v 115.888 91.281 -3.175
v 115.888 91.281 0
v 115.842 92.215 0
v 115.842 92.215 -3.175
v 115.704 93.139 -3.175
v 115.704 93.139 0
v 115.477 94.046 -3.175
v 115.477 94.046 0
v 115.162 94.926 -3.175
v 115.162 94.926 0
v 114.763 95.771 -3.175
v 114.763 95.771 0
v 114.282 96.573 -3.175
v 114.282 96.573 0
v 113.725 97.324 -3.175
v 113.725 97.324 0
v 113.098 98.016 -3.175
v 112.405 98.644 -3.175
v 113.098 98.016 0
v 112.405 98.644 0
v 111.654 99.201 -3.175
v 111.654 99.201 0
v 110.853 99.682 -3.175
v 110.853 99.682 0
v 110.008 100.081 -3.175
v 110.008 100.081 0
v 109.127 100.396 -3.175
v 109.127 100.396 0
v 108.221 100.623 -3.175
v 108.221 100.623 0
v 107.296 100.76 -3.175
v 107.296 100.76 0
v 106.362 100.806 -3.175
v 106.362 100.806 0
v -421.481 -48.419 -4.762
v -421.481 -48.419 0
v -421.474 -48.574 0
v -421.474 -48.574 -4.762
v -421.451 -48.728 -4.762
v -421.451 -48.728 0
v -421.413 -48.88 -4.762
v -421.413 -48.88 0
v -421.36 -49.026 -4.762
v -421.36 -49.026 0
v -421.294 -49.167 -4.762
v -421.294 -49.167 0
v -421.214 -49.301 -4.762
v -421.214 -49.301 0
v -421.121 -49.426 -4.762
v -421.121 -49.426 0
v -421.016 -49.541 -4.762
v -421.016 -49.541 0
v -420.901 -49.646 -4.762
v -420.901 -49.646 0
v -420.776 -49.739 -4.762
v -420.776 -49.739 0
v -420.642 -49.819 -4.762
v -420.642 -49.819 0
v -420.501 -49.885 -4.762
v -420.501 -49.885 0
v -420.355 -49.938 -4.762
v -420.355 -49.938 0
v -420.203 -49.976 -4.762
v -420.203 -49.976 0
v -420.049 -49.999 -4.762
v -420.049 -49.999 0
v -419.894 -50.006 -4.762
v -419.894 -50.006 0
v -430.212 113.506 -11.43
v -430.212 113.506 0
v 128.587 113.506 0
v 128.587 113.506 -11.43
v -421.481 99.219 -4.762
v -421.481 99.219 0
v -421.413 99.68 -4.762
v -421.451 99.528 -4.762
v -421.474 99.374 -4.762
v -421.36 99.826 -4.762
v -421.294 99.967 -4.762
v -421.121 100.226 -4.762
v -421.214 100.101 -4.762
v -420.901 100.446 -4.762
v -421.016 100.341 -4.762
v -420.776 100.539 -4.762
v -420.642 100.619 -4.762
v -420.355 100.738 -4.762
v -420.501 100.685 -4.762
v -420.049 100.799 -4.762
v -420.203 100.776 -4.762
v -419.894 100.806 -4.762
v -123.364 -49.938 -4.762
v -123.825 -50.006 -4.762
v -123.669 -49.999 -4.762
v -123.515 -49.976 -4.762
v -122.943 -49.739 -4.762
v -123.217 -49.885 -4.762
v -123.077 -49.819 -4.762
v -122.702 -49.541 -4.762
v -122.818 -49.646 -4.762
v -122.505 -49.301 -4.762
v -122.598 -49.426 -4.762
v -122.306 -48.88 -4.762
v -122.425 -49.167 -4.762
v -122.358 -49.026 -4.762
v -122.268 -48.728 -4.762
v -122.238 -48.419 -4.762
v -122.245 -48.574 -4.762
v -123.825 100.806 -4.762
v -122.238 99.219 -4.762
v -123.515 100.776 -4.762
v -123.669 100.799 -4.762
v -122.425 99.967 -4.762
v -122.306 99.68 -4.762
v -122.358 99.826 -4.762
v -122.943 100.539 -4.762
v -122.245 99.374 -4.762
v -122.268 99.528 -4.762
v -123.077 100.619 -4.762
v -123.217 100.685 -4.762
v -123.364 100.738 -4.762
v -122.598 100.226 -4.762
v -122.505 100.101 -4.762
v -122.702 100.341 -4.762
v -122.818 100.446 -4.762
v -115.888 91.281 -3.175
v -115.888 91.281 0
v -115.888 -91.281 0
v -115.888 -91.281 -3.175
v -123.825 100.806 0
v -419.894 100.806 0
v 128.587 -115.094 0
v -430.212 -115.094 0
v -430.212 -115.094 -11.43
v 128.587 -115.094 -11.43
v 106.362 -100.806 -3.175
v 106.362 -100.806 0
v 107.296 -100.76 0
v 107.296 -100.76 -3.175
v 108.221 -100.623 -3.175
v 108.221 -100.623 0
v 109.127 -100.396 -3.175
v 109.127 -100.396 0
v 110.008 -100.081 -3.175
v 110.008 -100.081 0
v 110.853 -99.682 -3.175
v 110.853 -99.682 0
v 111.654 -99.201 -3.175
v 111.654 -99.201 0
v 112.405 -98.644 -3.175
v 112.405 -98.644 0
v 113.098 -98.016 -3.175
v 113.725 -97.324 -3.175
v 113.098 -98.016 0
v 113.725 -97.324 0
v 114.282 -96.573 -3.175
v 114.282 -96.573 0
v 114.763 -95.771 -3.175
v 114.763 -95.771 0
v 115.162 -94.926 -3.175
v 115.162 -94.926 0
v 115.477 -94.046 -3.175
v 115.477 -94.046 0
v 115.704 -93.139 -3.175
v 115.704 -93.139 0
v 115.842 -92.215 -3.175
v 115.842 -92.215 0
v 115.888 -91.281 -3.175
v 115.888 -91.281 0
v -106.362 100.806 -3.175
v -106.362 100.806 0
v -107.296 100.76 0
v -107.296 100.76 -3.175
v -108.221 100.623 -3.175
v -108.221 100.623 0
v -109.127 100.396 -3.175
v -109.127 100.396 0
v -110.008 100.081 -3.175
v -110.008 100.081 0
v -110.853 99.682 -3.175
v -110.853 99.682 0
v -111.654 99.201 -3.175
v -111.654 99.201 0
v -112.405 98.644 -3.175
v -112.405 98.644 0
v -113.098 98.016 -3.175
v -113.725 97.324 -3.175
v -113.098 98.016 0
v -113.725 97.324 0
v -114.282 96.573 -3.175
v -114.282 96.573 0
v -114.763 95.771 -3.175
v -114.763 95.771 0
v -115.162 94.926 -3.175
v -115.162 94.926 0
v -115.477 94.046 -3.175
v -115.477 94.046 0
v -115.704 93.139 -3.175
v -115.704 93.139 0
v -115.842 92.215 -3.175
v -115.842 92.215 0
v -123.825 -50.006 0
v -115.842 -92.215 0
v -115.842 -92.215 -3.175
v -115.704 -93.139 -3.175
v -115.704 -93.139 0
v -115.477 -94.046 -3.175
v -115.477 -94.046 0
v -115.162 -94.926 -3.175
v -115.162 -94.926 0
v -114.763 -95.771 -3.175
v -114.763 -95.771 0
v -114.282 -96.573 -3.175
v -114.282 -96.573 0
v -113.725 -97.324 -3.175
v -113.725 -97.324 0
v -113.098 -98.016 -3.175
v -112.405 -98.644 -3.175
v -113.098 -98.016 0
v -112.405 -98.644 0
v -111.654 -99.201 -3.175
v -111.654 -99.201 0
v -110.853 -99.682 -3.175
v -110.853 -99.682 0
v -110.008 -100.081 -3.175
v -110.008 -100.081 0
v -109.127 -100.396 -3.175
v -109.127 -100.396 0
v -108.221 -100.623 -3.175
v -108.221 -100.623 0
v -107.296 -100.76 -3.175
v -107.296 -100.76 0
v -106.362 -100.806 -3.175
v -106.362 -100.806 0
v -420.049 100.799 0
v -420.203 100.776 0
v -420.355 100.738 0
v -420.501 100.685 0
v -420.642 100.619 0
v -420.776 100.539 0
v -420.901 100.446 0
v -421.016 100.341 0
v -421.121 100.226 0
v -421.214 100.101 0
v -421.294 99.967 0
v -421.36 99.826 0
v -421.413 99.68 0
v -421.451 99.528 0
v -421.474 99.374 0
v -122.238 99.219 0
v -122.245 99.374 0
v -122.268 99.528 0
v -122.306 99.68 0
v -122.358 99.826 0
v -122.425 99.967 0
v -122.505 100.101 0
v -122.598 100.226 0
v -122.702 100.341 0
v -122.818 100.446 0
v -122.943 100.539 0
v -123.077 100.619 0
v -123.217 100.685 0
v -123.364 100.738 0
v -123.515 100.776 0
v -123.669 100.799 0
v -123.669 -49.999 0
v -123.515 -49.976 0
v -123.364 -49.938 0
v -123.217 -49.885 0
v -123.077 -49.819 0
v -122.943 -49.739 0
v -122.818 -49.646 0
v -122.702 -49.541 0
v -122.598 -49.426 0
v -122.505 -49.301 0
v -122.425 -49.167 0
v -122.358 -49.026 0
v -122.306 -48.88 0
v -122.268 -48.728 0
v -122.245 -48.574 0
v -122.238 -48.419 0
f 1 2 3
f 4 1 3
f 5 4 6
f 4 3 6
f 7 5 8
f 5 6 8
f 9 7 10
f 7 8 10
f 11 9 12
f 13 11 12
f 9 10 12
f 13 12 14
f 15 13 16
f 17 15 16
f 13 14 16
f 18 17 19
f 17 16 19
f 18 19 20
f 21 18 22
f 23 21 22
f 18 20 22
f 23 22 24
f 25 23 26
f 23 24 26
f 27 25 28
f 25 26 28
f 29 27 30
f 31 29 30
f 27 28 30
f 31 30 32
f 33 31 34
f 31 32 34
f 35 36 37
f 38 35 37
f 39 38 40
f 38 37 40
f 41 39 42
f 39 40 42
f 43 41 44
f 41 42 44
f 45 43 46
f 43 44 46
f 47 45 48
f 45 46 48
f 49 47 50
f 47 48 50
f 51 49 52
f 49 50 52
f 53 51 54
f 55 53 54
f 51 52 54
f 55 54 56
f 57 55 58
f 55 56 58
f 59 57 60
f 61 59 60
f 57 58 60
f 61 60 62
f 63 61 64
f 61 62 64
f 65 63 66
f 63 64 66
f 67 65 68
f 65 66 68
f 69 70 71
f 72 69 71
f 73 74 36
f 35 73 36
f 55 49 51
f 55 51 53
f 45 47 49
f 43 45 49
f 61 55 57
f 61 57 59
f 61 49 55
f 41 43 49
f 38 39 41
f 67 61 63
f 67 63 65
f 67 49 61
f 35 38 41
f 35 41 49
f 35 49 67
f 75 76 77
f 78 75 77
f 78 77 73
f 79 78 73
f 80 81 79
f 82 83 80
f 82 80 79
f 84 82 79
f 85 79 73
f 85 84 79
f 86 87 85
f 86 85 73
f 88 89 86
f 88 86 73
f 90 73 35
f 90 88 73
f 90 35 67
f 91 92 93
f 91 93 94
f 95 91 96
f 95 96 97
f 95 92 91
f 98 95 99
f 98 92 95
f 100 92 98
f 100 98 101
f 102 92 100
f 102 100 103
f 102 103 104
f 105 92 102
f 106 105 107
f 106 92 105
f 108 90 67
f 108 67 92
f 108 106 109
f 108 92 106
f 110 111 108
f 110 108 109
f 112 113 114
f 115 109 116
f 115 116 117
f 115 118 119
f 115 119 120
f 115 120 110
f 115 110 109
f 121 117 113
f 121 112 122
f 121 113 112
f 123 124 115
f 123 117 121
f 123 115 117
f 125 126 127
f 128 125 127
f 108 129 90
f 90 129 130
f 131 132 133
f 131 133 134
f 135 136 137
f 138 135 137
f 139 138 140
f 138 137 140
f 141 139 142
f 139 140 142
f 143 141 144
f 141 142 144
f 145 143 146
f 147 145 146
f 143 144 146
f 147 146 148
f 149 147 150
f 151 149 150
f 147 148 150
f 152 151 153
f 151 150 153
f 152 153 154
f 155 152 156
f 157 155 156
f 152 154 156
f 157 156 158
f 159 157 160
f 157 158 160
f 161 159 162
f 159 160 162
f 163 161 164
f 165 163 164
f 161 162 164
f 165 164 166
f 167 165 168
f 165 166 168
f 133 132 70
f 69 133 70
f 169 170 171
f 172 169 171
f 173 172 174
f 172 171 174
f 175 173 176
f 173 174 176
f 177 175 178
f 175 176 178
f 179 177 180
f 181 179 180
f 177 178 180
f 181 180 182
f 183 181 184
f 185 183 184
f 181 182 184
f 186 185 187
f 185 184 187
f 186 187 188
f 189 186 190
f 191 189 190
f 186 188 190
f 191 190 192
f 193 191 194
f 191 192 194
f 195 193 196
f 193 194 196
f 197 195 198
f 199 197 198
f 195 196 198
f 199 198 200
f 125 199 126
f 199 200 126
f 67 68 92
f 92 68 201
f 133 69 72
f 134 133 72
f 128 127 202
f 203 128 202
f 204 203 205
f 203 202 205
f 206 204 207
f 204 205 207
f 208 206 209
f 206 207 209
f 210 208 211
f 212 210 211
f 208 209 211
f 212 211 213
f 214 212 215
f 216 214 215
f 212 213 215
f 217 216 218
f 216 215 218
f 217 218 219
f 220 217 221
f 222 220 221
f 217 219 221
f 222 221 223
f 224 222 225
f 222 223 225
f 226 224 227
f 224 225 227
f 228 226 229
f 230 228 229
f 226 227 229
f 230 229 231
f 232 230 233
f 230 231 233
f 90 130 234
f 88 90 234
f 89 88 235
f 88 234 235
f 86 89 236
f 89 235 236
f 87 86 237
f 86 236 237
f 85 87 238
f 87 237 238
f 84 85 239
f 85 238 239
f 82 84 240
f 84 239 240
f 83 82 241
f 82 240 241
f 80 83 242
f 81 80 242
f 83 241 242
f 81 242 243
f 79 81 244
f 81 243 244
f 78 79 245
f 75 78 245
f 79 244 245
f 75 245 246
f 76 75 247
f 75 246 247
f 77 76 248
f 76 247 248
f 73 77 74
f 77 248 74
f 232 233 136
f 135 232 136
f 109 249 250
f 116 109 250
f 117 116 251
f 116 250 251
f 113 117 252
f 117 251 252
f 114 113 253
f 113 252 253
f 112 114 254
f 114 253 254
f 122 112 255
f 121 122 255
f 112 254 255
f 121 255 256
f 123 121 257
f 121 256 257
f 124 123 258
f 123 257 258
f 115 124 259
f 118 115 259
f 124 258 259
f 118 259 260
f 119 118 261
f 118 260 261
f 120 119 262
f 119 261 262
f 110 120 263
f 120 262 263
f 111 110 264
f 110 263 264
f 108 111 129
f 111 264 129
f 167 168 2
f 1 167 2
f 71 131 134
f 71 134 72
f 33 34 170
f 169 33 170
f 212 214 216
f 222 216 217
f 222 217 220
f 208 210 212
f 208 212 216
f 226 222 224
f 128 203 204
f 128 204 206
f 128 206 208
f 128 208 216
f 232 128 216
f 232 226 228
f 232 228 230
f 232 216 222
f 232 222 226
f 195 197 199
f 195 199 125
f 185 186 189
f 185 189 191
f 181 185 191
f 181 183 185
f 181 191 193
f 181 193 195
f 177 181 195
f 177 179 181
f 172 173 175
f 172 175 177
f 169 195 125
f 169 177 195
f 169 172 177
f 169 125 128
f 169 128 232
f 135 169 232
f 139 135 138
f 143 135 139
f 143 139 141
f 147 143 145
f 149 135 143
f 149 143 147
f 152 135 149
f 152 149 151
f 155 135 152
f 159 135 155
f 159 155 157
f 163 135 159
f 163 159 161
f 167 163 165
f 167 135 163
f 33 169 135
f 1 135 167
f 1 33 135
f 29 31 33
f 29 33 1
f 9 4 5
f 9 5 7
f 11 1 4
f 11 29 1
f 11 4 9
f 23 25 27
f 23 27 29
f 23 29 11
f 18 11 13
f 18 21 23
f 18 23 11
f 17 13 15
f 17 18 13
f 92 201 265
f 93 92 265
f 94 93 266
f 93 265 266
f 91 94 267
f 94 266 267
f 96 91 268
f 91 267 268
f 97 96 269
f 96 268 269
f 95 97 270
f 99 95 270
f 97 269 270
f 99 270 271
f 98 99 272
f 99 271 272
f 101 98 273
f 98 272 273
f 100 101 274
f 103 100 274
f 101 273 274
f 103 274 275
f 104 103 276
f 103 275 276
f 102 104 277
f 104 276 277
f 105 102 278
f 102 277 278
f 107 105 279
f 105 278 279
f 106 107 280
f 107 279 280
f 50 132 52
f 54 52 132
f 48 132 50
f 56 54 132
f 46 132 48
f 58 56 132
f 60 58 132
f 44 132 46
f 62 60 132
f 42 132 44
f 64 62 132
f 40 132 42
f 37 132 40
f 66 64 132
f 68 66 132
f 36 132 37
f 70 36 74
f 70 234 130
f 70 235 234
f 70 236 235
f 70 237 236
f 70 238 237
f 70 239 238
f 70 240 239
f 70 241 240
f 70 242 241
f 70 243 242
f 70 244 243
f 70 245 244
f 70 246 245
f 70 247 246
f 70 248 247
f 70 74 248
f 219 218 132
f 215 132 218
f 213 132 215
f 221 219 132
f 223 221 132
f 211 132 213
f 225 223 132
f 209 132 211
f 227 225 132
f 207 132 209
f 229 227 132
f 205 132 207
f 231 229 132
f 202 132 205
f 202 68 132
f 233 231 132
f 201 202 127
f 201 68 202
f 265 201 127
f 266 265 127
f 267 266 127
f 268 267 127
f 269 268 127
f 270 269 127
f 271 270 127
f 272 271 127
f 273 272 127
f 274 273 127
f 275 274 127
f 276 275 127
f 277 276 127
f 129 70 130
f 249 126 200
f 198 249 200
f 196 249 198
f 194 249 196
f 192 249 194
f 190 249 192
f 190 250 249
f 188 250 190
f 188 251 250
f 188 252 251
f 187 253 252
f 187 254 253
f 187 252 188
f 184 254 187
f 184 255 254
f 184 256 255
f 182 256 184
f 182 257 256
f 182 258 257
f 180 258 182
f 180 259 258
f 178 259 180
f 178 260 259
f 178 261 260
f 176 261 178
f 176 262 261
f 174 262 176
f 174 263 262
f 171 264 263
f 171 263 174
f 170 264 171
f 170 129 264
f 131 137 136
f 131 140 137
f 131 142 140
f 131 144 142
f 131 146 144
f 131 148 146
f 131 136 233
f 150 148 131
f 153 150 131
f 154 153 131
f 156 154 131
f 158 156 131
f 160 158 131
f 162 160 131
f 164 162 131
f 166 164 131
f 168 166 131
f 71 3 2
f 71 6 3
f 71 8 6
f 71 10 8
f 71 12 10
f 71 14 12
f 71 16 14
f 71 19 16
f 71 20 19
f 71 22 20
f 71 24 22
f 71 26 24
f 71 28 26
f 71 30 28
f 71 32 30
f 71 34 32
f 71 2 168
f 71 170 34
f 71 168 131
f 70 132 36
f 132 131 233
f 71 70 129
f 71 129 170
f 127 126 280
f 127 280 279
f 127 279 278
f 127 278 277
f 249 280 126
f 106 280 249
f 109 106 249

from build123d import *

# Parameters (mm, degrees)
F0_W     = 558.8
F0_H     = 228.6
F1_DEPTH = 11.43
F2_DEPTH = 4.7625
F3_DEPTH = 3.175


with BuildPart() as f1:
    # F0 (on Top) → F1 (new body)
    with BuildSketch(Plane.XY):
        with Locations((-150.8125, -0.79375)):
            Rectangle(F0_W, F0_H)
        with BuildLine():
            ThreePointArc((-421.48125, 99.21875), (-421.016282, 100.341282), (-419.89375, 100.80625))
            Line((-419.89375, 100.80625), (-123.825, 100.80625))
            ThreePointArc((-123.825, 100.80625), (-122.702468, 100.341282), (-122.2375, 99.21875))
            Line((-122.2375, 99.21875), (-122.2375, -48.41875))
            ThreePointArc((-122.2375, -48.41875), (-122.702468, -49.541282), (-123.825, -50.00625))
            Line((-123.825, -50.00625), (-419.89375, -50.00625))
            ThreePointArc((-419.89375, -50.00625), (-421.016282, -49.541282), (-421.48125, -48.41875))
            Line((-421.48125, -48.41875), (-421.48125, 99.21875))
        make_face(mode=Mode.SUBTRACT)
        with BuildLine():
            Line((-106.3625, 100.80625), (106.3625, 100.80625))
            ThreePointArc((106.3625, 100.80625), (113.097692, 98.016442), (115.8875, 91.28125))
            Line((115.8875, 91.28125), (115.8875, -91.28125))
            ThreePointArc((115.8875, -91.28125), (113.097692, -98.016442), (106.3625, -100.80625))
            Line((106.3625, -100.80625), (-106.3625, -100.80625))
            ThreePointArc((-106.3625, -100.80625), (-113.097692, -98.016442), (-115.8875, -91.28125))
            Line((-115.8875, -91.28125), (-115.8875, 91.28125))
            ThreePointArc((-115.8875, 91.28125), (-113.097692, 98.016442), (-106.3625, 100.80625))
        make_face(mode=Mode.SUBTRACT)
        with BuildLine():
            Line((-123.825, 100.80625), (-419.89375, 100.80625))
            ThreePointArc((-419.89375, 100.80625), (-421.016282, 100.341282), (-421.48125, 99.21875))
            Line((-421.48125, 99.21875), (-421.48125, -48.41875))
            ThreePointArc((-421.48125, -48.41875), (-421.016282, -49.541282), (-419.89375, -50.00625))
            Line((-419.89375, -50.00625), (-123.825, -50.00625))
            ThreePointArc((-123.825, -50.00625), (-122.702468, -49.541282), (-122.2375, -48.41875))
            Line((-122.2375, -48.41875), (-122.2375, 99.21875))
            ThreePointArc((-122.2375, 99.21875), (-122.702468, 100.341282), (-123.825, 100.80625))
        make_face()
        with BuildLine():
            ThreePointArc((115.8875, 91.28125), (113.097692, 98.016442), (106.3625, 100.80625))
            Line((106.3625, 100.80625), (-106.3625, 100.80625))
            ThreePointArc((-106.3625, 100.80625), (-113.097692, 98.016442), (-115.8875, 91.28125))
            Line((-115.8875, 91.28125), (-115.8875, -91.28125))
            ThreePointArc((-115.8875, -91.28125), (-113.097692, -98.016442), (-106.3625, -100.80625))
            Line((-106.3625, -100.80625), (106.3625, -100.80625))
            ThreePointArc((106.3625, -100.80625), (113.097692, -98.016442), (115.8875, -91.28125))
            Line((115.8875, -91.28125), (115.8875, 91.28125))
        make_face()
    extrude(amount=-F1_DEPTH)

    # F0 (on Top) → F2 (cut)
    with BuildSketch(Plane.XY):
        with BuildLine():
            Line((-123.825, 100.80625), (-419.89375, 100.80625))
            ThreePointArc((-419.89375, 100.80625), (-421.016282, 100.341282), (-421.48125, 99.21875))
            Line((-421.48125, 99.21875), (-421.48125, -48.41875))
            ThreePointArc((-421.48125, -48.41875), (-421.016282, -49.541282), (-419.89375, -50.00625))
            Line((-419.89375, -50.00625), (-123.825, -50.00625))
            ThreePointArc((-123.825, -50.00625), (-122.702468, -49.541282), (-122.2375, -48.41875))
            Line((-122.2375, -48.41875), (-122.2375, 99.21875))
            ThreePointArc((-122.2375, 99.21875), (-122.702468, 100.341282), (-123.825, 100.80625))
        make_face()
    extrude(amount=-F2_DEPTH, mode=Mode.SUBTRACT)

    # F0 (on Top) → F3 (cut)
    with BuildSketch(Plane.XY):
        with BuildLine():
            ThreePointArc((115.8875, 91.28125), (113.097692, 98.016442), (106.3625, 100.80625))
            Line((106.3625, 100.80625), (-106.3625, 100.80625))
            ThreePointArc((-106.3625, 100.80625), (-113.097692, 98.016442), (-115.8875, 91.28125))
            Line((-115.8875, 91.28125), (-115.8875, -91.28125))
            ThreePointArc((-115.8875, -91.28125), (-113.097692, -98.016442), (-106.3625, -100.80625))
            Line((-106.3625, -100.80625), (106.3625, -100.80625))
            ThreePointArc((106.3625, -100.80625), (113.097692, -98.016442), (115.8875, -91.28125))
            Line((115.8875, -91.28125), (115.8875, 91.28125))
        make_face()
    extrude(amount=-F3_DEPTH, mode=Mode.SUBTRACT)


solid = f1.part
